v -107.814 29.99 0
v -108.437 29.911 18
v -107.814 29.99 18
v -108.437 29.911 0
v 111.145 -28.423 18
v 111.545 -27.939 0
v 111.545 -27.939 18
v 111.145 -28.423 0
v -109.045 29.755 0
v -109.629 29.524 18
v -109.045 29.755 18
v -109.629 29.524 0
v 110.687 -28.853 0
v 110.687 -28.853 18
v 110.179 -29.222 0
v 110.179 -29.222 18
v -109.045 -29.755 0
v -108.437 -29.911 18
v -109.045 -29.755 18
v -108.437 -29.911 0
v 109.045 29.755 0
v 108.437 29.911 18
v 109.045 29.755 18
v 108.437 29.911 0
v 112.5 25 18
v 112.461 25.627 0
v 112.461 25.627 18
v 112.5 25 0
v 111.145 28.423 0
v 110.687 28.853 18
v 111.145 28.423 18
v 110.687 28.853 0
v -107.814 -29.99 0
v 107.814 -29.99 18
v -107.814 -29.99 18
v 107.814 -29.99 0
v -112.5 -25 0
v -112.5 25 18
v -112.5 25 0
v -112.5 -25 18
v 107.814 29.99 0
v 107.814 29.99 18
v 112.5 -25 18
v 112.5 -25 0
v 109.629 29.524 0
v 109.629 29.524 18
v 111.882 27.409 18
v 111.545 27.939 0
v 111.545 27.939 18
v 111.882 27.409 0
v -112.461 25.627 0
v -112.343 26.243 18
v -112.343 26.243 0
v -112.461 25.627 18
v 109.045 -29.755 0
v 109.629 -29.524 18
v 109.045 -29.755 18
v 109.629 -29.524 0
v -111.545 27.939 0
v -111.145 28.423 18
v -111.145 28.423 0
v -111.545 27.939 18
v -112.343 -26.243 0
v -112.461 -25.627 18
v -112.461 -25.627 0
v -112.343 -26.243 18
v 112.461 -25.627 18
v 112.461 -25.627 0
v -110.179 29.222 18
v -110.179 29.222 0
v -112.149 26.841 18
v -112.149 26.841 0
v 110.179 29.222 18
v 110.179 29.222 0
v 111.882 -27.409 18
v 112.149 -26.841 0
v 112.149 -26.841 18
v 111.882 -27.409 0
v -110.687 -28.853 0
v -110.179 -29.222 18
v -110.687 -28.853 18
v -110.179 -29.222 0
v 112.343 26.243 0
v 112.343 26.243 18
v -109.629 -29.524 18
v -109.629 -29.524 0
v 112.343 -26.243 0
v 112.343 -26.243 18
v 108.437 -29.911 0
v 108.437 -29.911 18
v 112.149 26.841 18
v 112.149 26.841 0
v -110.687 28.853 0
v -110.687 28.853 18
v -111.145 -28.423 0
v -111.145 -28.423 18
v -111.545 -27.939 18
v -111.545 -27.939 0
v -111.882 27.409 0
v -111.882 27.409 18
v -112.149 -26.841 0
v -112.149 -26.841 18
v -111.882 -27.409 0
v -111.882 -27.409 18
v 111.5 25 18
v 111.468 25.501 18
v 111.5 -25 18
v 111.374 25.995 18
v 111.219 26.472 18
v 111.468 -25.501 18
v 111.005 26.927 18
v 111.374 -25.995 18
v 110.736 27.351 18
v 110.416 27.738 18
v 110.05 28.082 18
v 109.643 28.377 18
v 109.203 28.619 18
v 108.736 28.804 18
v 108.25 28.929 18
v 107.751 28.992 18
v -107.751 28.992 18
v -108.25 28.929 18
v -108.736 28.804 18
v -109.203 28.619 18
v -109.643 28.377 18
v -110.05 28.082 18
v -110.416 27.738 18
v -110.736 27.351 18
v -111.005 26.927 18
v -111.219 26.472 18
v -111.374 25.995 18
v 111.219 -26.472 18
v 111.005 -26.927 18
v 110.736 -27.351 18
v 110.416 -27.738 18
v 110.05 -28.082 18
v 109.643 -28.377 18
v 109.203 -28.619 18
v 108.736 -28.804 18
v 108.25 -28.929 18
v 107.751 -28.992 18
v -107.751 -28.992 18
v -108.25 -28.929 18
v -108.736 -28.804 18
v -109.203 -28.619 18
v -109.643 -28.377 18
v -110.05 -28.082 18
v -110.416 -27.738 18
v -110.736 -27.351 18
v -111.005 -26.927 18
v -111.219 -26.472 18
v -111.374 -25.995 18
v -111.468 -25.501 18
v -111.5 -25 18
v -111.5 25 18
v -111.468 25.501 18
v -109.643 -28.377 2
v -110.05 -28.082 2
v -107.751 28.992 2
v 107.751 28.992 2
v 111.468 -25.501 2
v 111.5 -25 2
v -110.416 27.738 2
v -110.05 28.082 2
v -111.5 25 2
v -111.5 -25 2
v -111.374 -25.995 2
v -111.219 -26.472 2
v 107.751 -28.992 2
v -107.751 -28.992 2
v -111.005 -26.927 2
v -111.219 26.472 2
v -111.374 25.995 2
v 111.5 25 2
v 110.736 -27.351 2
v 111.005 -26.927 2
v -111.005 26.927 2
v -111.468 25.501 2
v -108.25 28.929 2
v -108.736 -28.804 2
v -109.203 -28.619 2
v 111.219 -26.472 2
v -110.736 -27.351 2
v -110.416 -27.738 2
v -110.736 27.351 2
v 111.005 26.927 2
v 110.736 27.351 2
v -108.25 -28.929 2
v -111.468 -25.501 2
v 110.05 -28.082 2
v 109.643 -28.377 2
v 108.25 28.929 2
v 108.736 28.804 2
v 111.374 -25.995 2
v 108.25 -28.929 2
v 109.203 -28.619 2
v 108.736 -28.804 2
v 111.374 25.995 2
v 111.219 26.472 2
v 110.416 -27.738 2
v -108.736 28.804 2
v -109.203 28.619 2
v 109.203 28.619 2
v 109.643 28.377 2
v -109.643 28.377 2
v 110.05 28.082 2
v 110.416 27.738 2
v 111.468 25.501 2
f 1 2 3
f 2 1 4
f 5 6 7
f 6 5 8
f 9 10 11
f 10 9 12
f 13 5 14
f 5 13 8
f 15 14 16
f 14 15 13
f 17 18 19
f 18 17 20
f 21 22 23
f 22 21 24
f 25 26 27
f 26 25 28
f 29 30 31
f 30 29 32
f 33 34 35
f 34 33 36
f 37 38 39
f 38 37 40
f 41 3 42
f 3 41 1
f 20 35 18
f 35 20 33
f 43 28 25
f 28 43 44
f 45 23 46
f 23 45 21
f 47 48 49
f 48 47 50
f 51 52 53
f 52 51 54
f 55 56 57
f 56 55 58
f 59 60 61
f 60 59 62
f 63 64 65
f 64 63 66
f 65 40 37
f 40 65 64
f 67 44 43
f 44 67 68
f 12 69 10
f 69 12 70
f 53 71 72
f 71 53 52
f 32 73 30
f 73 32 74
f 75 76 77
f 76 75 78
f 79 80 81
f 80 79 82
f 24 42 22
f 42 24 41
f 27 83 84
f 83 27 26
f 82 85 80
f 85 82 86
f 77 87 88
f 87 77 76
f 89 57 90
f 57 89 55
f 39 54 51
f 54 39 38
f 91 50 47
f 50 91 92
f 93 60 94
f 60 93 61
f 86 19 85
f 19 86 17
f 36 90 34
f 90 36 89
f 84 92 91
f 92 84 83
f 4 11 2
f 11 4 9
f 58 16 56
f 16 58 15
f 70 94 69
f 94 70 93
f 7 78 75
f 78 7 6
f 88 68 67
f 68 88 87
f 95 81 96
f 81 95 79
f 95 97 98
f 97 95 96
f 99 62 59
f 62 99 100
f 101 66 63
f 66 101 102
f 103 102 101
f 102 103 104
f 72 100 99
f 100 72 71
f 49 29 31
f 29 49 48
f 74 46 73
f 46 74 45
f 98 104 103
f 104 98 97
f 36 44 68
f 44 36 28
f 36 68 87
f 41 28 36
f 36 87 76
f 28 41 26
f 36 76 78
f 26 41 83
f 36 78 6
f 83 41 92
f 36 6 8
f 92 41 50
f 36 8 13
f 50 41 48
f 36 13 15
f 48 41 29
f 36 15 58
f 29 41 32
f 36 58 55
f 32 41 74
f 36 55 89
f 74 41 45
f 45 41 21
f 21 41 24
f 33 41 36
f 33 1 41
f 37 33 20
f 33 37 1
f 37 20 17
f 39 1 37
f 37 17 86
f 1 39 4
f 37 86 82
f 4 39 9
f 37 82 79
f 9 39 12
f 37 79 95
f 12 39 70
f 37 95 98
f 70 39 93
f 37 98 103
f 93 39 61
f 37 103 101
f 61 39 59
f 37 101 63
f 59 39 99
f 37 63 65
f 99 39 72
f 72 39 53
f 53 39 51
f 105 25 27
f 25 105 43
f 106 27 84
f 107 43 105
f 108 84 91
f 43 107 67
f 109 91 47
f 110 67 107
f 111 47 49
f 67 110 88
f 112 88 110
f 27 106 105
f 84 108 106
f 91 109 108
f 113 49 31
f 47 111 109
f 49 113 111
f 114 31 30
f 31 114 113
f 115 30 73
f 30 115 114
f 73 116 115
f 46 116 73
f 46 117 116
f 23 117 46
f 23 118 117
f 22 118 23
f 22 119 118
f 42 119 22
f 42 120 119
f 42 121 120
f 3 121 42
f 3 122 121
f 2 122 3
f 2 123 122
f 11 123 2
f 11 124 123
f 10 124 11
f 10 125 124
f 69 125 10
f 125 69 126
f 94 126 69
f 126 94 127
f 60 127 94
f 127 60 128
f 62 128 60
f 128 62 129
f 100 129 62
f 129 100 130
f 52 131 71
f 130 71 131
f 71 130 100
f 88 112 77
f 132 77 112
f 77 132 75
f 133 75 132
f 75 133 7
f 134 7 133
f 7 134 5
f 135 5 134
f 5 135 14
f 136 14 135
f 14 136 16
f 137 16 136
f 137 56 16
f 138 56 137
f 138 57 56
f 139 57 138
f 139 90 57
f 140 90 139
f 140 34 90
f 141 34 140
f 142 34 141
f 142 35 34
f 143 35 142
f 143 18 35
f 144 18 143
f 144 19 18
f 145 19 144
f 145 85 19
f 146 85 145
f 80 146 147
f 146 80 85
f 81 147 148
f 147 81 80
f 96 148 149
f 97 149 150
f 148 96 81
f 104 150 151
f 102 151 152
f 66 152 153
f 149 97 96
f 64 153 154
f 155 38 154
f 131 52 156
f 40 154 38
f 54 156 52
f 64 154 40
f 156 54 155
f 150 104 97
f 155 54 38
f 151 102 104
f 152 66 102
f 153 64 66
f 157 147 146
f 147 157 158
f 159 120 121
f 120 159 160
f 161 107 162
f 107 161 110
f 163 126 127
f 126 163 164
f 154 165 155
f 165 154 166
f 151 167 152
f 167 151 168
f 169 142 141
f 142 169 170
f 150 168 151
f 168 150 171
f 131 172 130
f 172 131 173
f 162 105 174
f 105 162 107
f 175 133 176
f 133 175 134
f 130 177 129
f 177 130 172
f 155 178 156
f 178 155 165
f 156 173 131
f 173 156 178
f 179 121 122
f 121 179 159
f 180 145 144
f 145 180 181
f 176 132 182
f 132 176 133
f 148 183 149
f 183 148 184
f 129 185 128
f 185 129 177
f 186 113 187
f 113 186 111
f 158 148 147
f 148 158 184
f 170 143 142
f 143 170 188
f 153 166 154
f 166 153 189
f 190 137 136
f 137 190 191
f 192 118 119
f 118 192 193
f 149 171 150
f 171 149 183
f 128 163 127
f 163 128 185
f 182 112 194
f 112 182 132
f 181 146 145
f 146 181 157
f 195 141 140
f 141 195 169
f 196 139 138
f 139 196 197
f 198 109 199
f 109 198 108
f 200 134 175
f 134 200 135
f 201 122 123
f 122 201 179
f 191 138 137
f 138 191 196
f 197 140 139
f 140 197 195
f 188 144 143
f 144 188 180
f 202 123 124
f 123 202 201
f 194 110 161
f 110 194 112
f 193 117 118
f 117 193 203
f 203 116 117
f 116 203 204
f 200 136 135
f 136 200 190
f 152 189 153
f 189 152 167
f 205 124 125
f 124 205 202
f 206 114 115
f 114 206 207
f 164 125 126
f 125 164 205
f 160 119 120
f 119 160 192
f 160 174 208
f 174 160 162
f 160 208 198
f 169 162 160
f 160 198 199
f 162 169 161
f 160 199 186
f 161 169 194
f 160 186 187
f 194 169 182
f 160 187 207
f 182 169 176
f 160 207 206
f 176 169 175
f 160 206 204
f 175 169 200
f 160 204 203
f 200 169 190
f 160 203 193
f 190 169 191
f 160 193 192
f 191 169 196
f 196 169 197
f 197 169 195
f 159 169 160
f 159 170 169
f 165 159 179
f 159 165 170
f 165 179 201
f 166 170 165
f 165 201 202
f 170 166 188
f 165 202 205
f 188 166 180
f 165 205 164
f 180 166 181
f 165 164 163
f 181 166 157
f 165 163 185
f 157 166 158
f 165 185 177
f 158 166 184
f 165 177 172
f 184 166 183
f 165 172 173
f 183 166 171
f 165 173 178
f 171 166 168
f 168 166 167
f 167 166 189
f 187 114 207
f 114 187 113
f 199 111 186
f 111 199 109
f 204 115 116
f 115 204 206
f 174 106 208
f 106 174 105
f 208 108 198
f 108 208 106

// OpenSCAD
$fn = 50;


difference() {
	union() {
		hull() {
			translate(v = [-107.5000000000, 25.0000000000, 0]) {
				cylinder(h = 18, r = 5);
			}
			translate(v = [107.5000000000, 25.0000000000, 0]) {
				cylinder(h = 18, r = 5);
			}
			translate(v = [-107.5000000000, -25.0000000000, 0]) {
				cylinder(h = 18, r = 5);
			}
			translate(v = [107.5000000000, -25.0000000000, 0]) {
				cylinder(h = 18, r = 5);
			}
		}
	}
	union() {
		translate(v = [0, 0, 2]) {
			hull() {
				translate(v = [-107.5000000000, 25.0000000000, 0]) {
					cylinder(h = 16, r = 4);
				}
				translate(v = [107.5000000000, 25.0000000000, 0]) {
					cylinder(h = 16, r = 4);
				}
				translate(v = [-107.5000000000, -25.0000000000, 0]) {
					cylinder(h = 16, r = 4);
				}
				translate(v = [107.5000000000, -25.0000000000, 0]) {
					cylinder(h = 16, r = 4);
				}
			}
		}
	}
}
